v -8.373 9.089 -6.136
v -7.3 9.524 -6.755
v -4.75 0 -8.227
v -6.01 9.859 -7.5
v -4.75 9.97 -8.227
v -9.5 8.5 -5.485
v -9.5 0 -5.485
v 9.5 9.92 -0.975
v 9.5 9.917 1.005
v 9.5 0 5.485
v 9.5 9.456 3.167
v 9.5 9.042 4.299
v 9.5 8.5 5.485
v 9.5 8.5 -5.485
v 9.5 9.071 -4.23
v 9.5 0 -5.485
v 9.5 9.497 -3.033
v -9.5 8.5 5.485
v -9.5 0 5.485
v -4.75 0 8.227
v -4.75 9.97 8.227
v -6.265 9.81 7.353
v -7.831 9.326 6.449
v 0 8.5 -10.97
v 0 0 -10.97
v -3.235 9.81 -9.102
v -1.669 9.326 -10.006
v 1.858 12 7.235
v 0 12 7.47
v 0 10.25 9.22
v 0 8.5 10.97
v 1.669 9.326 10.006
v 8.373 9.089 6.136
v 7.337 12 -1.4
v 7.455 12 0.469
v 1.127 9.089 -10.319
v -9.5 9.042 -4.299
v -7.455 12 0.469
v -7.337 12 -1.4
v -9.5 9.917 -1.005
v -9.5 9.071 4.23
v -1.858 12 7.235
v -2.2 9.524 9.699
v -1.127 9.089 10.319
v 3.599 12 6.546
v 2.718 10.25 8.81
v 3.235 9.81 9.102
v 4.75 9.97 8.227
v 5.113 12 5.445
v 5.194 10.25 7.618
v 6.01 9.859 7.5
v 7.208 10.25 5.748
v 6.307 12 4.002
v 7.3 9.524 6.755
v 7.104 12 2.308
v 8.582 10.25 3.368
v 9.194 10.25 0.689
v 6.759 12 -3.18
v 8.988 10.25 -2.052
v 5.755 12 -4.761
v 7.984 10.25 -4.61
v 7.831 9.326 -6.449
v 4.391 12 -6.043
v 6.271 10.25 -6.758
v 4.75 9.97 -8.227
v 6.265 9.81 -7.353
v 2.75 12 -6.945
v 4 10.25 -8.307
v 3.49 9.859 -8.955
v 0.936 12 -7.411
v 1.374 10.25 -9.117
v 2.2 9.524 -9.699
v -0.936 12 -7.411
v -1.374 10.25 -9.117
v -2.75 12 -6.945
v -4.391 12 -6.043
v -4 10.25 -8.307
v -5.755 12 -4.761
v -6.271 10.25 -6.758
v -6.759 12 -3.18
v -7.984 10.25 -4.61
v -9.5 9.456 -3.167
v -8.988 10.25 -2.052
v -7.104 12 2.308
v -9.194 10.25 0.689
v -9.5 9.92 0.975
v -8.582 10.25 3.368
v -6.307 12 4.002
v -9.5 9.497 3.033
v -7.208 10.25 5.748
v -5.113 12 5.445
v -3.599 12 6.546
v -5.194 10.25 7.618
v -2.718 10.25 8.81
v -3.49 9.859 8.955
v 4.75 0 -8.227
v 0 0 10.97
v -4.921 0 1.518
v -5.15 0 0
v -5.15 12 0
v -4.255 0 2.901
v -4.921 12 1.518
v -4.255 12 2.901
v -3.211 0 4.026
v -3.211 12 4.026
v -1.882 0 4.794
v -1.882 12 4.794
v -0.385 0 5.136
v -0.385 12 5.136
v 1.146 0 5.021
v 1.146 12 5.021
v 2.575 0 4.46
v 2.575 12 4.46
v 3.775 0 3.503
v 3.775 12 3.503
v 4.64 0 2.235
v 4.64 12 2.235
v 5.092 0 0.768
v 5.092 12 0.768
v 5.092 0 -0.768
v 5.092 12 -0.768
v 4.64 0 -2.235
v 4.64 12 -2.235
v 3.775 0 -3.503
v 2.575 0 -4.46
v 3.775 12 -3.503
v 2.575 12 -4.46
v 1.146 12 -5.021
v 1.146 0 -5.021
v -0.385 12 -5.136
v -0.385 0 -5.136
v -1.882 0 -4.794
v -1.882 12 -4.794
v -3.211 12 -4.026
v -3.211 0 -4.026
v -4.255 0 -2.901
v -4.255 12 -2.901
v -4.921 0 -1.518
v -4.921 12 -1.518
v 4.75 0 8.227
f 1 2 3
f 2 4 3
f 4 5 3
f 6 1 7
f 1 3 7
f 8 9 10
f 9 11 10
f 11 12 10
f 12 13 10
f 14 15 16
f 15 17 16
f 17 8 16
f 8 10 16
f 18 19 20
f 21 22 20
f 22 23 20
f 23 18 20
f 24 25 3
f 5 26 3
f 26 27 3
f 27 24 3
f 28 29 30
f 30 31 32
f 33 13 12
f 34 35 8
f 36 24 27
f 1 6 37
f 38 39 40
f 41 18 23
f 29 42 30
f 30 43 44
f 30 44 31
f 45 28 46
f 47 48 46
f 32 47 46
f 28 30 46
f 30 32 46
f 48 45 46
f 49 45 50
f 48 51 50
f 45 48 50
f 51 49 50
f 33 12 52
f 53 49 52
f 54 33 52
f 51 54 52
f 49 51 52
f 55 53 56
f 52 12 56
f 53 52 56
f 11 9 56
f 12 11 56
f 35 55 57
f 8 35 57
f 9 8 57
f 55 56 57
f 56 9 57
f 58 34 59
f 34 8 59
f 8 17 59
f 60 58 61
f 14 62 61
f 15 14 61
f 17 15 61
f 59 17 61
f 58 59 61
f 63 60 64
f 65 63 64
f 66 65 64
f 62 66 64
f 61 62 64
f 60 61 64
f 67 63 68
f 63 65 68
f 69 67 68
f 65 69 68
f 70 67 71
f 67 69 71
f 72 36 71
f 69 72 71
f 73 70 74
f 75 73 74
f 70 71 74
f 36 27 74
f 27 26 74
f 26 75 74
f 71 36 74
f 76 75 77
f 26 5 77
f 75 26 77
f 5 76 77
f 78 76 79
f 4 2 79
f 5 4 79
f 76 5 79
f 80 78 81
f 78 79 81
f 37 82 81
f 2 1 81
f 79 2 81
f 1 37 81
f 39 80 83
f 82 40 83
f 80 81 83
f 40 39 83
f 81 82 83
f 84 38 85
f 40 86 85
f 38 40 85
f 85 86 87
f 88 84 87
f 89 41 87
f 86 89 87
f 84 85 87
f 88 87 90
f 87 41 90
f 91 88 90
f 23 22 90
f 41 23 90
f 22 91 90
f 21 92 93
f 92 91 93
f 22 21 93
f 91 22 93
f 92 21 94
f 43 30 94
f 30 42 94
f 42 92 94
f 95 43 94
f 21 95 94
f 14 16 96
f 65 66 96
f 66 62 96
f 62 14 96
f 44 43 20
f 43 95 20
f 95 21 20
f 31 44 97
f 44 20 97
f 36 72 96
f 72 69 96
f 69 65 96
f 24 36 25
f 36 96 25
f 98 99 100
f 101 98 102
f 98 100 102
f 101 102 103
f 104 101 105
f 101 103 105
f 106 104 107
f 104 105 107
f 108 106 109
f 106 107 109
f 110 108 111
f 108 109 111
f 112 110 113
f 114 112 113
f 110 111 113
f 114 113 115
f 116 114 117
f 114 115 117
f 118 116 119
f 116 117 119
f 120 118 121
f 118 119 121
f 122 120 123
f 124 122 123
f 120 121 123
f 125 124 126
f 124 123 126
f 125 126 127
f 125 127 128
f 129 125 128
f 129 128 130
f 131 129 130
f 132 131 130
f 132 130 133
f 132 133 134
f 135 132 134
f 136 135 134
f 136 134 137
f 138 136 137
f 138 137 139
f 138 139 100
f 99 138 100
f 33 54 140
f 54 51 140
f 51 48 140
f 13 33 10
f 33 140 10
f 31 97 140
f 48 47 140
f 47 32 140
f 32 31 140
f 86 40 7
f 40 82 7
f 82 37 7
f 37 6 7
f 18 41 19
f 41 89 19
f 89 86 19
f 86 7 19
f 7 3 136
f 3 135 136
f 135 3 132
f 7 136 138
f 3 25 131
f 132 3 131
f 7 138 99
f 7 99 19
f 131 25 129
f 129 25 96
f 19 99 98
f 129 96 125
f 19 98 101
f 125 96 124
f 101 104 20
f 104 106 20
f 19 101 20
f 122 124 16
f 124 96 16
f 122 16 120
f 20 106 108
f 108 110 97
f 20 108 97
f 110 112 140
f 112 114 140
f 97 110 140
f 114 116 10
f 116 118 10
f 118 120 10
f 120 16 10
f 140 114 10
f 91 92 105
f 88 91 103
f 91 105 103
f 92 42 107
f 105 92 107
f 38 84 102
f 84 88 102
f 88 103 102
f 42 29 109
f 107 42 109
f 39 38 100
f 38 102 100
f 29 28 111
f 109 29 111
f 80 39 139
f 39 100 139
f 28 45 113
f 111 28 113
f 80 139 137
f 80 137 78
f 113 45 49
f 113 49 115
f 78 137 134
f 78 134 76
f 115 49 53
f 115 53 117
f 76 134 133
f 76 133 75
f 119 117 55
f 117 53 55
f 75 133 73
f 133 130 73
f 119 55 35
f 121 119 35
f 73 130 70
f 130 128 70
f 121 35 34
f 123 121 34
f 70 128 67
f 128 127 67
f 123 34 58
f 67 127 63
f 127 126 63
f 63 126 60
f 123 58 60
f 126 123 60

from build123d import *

# Parameters (mm, degrees)
F3_DEPTH = 12.001
F4_D     = 10.3


with BuildPart() as f2:
    # F1 (on Right) → F2 (revolve)
    with BuildSketch(Plane.YZ):
        Polygon((0, 9.5), (0, 0), (12, 0), (12, 7.4696551146), (8.5, 10.9696551146), (0, 10.9696551146), align=None)
    revolve(axis=Axis((0, 6, 0), (0, 1, 0)))

    # F0 (on Front) → F3 (cut, through all)
    with BuildSketch(Plane.XZ):
        with BuildLine():
            Line((-9.5, -5.4848275573), (-9.5, 0))
            Line((-9.5, 0), (-9.5, 5.4848275573))
            ThreePointArc((-9.5, 5.4848275573), (-10.9696551146, 0), (-9.5, -5.4848275573))
        make_face()
        with BuildLine():
            Line((-9.5, 5.4848275573), (-4.7499997625, 8.2272414731))
            Line((-4.7499997625, 8.2272414731), (0, 10.9696551146))
            ThreePointArc((0, 10.9696551146), (-5.4848275573, 9.5), (-9.5, 5.4848275573))
        make_face()
        with BuildLine():
            Line((0, 10.9696551146), (4.7499998306, 8.2272414337))
            Line((4.7499998306, 8.2272414337), (9.5, 5.4848275573))
            ThreePointArc((9.5, 5.4848275573), (5.4848275573, 9.5), (0, 10.9696551146))
        make_face()
        with BuildLine():
            Line((9.5, 5.4848275573), (9.5, 0))
            Line((9.5, 0), (9.5, -5.4848275573))
            ThreePointArc((9.5, -5.4848275573), (10.5958731807, -2.8391556619), (10.9696551146, 0))
            ThreePointArc((10.9696551146, 0), (10.5958731807, 2.8391556619), (9.5, 5.4848275573))
        make_face()
        with BuildLine():
            Line((9.5, -5.4848275573), (4.7499998306, -8.2272414337))
            Line((4.7499998306, -8.2272414337), (0, -10.9696551146))
            ThreePointArc((0, -10.9696551146), (5.4848275573, -9.5), (9.5, -5.4848275573))
        make_face()
        with BuildLine():
            Line((0, -10.9696551146), (-4.749999949, -8.2272413654))
            Line((-4.749999949, -8.2272413654), (-9.5, -5.4848275573))
            ThreePointArc((-9.5, -5.4848275573), (-5.4848275573, -9.5), (0, -10.9696551146))
        make_face()
    extrude(amount=-F3_DEPTH, mode=Mode.SUBTRACT)

    # F4 (through all)
    with Locations(Plane.XZ):
        with Locations((0, 0)):
            Hole(F4_D / 2)


solid = f2.part
